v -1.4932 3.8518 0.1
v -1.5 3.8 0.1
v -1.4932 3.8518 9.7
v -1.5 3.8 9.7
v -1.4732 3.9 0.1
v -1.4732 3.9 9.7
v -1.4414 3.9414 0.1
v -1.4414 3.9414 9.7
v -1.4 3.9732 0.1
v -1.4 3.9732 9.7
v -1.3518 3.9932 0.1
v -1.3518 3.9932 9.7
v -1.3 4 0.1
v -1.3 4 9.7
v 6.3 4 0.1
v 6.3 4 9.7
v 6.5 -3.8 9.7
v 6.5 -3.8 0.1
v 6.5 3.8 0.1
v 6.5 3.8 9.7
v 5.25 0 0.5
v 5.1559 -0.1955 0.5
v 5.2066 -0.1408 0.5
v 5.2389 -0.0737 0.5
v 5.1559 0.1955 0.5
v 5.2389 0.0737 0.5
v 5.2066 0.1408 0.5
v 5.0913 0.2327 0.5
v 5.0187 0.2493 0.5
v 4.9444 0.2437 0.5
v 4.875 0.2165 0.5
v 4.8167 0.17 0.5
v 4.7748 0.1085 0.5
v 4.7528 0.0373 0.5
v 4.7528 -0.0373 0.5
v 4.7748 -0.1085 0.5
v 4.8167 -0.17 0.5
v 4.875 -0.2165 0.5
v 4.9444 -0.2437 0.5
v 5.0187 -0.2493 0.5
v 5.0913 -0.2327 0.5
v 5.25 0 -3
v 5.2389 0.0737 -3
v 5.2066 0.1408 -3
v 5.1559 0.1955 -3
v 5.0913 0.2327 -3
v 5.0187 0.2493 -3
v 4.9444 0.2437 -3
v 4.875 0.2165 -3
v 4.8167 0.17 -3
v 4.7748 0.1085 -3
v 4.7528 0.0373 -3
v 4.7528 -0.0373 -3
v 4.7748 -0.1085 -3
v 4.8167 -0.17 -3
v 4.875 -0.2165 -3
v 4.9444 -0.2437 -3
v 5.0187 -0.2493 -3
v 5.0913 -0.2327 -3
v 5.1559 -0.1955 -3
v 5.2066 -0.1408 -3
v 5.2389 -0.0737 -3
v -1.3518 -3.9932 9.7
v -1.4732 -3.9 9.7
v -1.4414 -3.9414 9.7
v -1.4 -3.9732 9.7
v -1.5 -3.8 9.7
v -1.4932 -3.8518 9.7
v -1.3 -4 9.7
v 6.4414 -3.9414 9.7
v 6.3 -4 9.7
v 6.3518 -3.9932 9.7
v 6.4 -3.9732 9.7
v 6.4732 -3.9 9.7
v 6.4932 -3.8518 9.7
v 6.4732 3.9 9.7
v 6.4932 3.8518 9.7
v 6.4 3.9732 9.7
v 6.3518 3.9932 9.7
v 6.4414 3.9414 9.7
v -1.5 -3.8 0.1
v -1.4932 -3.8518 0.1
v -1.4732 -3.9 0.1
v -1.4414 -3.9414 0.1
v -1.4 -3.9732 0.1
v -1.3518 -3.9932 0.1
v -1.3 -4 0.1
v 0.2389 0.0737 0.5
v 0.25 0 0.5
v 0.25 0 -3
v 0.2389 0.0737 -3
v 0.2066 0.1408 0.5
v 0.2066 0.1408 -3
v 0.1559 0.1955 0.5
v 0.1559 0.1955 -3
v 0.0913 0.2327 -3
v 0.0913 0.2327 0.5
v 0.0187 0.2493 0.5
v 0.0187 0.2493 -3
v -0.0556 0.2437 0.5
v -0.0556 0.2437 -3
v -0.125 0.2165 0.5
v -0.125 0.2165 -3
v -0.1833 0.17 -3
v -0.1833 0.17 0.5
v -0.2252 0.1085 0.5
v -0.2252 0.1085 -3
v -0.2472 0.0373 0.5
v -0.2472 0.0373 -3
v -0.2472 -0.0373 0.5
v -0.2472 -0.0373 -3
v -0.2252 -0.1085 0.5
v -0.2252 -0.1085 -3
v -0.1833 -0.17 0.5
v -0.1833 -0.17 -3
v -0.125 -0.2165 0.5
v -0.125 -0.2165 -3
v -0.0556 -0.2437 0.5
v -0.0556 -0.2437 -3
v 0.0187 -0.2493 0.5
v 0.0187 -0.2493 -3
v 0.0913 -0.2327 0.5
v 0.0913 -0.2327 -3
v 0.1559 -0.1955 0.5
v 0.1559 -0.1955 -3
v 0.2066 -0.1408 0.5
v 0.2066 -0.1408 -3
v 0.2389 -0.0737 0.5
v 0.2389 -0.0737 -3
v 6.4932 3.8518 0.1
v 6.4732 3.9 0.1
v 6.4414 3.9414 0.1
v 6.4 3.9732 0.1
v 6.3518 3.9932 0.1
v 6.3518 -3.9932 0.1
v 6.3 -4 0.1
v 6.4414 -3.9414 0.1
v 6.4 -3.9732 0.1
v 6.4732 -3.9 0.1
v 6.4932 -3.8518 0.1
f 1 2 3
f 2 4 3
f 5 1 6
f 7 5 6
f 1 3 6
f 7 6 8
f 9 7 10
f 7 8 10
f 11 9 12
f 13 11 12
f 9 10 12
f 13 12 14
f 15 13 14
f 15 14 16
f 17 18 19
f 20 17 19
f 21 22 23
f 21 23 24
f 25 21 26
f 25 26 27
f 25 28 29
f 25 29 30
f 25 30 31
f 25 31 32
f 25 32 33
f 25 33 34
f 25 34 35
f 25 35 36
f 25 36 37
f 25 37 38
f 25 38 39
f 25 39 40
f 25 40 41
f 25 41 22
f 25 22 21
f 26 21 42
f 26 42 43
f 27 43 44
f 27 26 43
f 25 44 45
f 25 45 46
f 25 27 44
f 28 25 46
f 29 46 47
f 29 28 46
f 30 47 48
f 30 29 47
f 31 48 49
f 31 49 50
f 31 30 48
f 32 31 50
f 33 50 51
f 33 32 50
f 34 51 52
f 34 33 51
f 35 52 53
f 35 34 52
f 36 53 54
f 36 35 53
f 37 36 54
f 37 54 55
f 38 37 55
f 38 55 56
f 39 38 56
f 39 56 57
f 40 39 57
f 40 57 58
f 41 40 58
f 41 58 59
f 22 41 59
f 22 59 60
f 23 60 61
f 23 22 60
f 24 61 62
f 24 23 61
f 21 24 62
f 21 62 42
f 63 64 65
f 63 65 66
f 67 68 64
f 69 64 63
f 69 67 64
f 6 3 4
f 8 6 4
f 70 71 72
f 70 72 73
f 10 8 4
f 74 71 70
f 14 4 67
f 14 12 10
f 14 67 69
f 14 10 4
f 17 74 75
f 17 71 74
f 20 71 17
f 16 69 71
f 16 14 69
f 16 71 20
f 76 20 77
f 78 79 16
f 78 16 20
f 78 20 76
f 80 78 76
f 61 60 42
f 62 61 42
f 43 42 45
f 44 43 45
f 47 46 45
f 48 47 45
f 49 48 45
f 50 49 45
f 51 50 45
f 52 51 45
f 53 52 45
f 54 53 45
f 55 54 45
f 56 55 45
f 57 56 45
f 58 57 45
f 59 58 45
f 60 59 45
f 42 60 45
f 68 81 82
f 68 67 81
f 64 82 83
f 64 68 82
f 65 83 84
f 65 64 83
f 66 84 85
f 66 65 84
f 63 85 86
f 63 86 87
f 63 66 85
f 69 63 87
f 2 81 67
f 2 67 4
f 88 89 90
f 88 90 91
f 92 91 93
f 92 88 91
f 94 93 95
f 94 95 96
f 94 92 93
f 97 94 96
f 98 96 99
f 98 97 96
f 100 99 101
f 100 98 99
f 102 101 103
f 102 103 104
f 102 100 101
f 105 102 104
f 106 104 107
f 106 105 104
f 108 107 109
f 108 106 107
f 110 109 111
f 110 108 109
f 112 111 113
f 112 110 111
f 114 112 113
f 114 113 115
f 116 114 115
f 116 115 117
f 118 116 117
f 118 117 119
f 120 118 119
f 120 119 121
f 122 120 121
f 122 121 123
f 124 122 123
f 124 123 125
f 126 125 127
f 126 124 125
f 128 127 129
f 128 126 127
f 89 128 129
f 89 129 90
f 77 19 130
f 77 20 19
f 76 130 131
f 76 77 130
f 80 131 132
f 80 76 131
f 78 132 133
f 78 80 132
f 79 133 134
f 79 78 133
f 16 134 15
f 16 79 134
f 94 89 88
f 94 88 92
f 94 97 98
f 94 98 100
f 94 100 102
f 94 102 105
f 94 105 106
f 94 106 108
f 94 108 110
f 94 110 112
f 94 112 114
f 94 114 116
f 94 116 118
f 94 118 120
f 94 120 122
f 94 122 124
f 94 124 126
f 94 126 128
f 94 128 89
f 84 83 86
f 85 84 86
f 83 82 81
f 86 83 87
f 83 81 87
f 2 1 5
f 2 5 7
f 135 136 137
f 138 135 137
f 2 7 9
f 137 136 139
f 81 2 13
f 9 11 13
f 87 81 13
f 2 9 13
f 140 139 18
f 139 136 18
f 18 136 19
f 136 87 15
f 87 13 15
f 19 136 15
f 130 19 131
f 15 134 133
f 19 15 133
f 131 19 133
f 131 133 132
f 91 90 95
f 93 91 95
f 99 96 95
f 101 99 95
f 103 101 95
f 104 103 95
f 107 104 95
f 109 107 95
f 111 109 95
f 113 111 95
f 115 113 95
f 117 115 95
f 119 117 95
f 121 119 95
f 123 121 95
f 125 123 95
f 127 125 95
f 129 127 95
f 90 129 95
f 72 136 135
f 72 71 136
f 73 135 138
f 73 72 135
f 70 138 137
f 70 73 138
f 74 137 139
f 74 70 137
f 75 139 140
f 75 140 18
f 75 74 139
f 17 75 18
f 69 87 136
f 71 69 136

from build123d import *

# Parameters (mm, degrees)
SKETCH001_R  = 0.25
PAD001_DEPTH = 3.5
SKETCH_W     = 8
SKETCH_H     = 8
PAD_DEPTH    = 9.6
FILLET_R     = 0.2


with BuildPart() as pad001:
    # Sketch001 → Pad001 (new body)
    with BuildSketch(Plane.XY.offset(0.5)):
        Circle(SKETCH001_R)
        with Locations((5, 0)):
            Circle(SKETCH001_R)
    extrude(amount=-PAD001_DEPTH)


with BuildPart() as fillet_body:
    # Sketch → Pad (new body)
    with BuildSketch(Plane.XY.offset(0.1)):
        with Locations((2.5, 0)):
            Rectangle(SKETCH_W, SKETCH_H)
    extrude(amount=PAD_DEPTH)

    # Fillet
    fillet_edges = [fillet_body.edges().sort_by_distance(p)[0] for p in [
        (6.5, -4, 4.9),
        (6.5, 4, 4.9),
        (-1.5, -4, 4.9),
        (-1.5, 4, 4.9),
    ]]
    fillet(fillet_edges, radius=FILLET_R)


solid = Compound([pad001.part, fillet_body.part])
